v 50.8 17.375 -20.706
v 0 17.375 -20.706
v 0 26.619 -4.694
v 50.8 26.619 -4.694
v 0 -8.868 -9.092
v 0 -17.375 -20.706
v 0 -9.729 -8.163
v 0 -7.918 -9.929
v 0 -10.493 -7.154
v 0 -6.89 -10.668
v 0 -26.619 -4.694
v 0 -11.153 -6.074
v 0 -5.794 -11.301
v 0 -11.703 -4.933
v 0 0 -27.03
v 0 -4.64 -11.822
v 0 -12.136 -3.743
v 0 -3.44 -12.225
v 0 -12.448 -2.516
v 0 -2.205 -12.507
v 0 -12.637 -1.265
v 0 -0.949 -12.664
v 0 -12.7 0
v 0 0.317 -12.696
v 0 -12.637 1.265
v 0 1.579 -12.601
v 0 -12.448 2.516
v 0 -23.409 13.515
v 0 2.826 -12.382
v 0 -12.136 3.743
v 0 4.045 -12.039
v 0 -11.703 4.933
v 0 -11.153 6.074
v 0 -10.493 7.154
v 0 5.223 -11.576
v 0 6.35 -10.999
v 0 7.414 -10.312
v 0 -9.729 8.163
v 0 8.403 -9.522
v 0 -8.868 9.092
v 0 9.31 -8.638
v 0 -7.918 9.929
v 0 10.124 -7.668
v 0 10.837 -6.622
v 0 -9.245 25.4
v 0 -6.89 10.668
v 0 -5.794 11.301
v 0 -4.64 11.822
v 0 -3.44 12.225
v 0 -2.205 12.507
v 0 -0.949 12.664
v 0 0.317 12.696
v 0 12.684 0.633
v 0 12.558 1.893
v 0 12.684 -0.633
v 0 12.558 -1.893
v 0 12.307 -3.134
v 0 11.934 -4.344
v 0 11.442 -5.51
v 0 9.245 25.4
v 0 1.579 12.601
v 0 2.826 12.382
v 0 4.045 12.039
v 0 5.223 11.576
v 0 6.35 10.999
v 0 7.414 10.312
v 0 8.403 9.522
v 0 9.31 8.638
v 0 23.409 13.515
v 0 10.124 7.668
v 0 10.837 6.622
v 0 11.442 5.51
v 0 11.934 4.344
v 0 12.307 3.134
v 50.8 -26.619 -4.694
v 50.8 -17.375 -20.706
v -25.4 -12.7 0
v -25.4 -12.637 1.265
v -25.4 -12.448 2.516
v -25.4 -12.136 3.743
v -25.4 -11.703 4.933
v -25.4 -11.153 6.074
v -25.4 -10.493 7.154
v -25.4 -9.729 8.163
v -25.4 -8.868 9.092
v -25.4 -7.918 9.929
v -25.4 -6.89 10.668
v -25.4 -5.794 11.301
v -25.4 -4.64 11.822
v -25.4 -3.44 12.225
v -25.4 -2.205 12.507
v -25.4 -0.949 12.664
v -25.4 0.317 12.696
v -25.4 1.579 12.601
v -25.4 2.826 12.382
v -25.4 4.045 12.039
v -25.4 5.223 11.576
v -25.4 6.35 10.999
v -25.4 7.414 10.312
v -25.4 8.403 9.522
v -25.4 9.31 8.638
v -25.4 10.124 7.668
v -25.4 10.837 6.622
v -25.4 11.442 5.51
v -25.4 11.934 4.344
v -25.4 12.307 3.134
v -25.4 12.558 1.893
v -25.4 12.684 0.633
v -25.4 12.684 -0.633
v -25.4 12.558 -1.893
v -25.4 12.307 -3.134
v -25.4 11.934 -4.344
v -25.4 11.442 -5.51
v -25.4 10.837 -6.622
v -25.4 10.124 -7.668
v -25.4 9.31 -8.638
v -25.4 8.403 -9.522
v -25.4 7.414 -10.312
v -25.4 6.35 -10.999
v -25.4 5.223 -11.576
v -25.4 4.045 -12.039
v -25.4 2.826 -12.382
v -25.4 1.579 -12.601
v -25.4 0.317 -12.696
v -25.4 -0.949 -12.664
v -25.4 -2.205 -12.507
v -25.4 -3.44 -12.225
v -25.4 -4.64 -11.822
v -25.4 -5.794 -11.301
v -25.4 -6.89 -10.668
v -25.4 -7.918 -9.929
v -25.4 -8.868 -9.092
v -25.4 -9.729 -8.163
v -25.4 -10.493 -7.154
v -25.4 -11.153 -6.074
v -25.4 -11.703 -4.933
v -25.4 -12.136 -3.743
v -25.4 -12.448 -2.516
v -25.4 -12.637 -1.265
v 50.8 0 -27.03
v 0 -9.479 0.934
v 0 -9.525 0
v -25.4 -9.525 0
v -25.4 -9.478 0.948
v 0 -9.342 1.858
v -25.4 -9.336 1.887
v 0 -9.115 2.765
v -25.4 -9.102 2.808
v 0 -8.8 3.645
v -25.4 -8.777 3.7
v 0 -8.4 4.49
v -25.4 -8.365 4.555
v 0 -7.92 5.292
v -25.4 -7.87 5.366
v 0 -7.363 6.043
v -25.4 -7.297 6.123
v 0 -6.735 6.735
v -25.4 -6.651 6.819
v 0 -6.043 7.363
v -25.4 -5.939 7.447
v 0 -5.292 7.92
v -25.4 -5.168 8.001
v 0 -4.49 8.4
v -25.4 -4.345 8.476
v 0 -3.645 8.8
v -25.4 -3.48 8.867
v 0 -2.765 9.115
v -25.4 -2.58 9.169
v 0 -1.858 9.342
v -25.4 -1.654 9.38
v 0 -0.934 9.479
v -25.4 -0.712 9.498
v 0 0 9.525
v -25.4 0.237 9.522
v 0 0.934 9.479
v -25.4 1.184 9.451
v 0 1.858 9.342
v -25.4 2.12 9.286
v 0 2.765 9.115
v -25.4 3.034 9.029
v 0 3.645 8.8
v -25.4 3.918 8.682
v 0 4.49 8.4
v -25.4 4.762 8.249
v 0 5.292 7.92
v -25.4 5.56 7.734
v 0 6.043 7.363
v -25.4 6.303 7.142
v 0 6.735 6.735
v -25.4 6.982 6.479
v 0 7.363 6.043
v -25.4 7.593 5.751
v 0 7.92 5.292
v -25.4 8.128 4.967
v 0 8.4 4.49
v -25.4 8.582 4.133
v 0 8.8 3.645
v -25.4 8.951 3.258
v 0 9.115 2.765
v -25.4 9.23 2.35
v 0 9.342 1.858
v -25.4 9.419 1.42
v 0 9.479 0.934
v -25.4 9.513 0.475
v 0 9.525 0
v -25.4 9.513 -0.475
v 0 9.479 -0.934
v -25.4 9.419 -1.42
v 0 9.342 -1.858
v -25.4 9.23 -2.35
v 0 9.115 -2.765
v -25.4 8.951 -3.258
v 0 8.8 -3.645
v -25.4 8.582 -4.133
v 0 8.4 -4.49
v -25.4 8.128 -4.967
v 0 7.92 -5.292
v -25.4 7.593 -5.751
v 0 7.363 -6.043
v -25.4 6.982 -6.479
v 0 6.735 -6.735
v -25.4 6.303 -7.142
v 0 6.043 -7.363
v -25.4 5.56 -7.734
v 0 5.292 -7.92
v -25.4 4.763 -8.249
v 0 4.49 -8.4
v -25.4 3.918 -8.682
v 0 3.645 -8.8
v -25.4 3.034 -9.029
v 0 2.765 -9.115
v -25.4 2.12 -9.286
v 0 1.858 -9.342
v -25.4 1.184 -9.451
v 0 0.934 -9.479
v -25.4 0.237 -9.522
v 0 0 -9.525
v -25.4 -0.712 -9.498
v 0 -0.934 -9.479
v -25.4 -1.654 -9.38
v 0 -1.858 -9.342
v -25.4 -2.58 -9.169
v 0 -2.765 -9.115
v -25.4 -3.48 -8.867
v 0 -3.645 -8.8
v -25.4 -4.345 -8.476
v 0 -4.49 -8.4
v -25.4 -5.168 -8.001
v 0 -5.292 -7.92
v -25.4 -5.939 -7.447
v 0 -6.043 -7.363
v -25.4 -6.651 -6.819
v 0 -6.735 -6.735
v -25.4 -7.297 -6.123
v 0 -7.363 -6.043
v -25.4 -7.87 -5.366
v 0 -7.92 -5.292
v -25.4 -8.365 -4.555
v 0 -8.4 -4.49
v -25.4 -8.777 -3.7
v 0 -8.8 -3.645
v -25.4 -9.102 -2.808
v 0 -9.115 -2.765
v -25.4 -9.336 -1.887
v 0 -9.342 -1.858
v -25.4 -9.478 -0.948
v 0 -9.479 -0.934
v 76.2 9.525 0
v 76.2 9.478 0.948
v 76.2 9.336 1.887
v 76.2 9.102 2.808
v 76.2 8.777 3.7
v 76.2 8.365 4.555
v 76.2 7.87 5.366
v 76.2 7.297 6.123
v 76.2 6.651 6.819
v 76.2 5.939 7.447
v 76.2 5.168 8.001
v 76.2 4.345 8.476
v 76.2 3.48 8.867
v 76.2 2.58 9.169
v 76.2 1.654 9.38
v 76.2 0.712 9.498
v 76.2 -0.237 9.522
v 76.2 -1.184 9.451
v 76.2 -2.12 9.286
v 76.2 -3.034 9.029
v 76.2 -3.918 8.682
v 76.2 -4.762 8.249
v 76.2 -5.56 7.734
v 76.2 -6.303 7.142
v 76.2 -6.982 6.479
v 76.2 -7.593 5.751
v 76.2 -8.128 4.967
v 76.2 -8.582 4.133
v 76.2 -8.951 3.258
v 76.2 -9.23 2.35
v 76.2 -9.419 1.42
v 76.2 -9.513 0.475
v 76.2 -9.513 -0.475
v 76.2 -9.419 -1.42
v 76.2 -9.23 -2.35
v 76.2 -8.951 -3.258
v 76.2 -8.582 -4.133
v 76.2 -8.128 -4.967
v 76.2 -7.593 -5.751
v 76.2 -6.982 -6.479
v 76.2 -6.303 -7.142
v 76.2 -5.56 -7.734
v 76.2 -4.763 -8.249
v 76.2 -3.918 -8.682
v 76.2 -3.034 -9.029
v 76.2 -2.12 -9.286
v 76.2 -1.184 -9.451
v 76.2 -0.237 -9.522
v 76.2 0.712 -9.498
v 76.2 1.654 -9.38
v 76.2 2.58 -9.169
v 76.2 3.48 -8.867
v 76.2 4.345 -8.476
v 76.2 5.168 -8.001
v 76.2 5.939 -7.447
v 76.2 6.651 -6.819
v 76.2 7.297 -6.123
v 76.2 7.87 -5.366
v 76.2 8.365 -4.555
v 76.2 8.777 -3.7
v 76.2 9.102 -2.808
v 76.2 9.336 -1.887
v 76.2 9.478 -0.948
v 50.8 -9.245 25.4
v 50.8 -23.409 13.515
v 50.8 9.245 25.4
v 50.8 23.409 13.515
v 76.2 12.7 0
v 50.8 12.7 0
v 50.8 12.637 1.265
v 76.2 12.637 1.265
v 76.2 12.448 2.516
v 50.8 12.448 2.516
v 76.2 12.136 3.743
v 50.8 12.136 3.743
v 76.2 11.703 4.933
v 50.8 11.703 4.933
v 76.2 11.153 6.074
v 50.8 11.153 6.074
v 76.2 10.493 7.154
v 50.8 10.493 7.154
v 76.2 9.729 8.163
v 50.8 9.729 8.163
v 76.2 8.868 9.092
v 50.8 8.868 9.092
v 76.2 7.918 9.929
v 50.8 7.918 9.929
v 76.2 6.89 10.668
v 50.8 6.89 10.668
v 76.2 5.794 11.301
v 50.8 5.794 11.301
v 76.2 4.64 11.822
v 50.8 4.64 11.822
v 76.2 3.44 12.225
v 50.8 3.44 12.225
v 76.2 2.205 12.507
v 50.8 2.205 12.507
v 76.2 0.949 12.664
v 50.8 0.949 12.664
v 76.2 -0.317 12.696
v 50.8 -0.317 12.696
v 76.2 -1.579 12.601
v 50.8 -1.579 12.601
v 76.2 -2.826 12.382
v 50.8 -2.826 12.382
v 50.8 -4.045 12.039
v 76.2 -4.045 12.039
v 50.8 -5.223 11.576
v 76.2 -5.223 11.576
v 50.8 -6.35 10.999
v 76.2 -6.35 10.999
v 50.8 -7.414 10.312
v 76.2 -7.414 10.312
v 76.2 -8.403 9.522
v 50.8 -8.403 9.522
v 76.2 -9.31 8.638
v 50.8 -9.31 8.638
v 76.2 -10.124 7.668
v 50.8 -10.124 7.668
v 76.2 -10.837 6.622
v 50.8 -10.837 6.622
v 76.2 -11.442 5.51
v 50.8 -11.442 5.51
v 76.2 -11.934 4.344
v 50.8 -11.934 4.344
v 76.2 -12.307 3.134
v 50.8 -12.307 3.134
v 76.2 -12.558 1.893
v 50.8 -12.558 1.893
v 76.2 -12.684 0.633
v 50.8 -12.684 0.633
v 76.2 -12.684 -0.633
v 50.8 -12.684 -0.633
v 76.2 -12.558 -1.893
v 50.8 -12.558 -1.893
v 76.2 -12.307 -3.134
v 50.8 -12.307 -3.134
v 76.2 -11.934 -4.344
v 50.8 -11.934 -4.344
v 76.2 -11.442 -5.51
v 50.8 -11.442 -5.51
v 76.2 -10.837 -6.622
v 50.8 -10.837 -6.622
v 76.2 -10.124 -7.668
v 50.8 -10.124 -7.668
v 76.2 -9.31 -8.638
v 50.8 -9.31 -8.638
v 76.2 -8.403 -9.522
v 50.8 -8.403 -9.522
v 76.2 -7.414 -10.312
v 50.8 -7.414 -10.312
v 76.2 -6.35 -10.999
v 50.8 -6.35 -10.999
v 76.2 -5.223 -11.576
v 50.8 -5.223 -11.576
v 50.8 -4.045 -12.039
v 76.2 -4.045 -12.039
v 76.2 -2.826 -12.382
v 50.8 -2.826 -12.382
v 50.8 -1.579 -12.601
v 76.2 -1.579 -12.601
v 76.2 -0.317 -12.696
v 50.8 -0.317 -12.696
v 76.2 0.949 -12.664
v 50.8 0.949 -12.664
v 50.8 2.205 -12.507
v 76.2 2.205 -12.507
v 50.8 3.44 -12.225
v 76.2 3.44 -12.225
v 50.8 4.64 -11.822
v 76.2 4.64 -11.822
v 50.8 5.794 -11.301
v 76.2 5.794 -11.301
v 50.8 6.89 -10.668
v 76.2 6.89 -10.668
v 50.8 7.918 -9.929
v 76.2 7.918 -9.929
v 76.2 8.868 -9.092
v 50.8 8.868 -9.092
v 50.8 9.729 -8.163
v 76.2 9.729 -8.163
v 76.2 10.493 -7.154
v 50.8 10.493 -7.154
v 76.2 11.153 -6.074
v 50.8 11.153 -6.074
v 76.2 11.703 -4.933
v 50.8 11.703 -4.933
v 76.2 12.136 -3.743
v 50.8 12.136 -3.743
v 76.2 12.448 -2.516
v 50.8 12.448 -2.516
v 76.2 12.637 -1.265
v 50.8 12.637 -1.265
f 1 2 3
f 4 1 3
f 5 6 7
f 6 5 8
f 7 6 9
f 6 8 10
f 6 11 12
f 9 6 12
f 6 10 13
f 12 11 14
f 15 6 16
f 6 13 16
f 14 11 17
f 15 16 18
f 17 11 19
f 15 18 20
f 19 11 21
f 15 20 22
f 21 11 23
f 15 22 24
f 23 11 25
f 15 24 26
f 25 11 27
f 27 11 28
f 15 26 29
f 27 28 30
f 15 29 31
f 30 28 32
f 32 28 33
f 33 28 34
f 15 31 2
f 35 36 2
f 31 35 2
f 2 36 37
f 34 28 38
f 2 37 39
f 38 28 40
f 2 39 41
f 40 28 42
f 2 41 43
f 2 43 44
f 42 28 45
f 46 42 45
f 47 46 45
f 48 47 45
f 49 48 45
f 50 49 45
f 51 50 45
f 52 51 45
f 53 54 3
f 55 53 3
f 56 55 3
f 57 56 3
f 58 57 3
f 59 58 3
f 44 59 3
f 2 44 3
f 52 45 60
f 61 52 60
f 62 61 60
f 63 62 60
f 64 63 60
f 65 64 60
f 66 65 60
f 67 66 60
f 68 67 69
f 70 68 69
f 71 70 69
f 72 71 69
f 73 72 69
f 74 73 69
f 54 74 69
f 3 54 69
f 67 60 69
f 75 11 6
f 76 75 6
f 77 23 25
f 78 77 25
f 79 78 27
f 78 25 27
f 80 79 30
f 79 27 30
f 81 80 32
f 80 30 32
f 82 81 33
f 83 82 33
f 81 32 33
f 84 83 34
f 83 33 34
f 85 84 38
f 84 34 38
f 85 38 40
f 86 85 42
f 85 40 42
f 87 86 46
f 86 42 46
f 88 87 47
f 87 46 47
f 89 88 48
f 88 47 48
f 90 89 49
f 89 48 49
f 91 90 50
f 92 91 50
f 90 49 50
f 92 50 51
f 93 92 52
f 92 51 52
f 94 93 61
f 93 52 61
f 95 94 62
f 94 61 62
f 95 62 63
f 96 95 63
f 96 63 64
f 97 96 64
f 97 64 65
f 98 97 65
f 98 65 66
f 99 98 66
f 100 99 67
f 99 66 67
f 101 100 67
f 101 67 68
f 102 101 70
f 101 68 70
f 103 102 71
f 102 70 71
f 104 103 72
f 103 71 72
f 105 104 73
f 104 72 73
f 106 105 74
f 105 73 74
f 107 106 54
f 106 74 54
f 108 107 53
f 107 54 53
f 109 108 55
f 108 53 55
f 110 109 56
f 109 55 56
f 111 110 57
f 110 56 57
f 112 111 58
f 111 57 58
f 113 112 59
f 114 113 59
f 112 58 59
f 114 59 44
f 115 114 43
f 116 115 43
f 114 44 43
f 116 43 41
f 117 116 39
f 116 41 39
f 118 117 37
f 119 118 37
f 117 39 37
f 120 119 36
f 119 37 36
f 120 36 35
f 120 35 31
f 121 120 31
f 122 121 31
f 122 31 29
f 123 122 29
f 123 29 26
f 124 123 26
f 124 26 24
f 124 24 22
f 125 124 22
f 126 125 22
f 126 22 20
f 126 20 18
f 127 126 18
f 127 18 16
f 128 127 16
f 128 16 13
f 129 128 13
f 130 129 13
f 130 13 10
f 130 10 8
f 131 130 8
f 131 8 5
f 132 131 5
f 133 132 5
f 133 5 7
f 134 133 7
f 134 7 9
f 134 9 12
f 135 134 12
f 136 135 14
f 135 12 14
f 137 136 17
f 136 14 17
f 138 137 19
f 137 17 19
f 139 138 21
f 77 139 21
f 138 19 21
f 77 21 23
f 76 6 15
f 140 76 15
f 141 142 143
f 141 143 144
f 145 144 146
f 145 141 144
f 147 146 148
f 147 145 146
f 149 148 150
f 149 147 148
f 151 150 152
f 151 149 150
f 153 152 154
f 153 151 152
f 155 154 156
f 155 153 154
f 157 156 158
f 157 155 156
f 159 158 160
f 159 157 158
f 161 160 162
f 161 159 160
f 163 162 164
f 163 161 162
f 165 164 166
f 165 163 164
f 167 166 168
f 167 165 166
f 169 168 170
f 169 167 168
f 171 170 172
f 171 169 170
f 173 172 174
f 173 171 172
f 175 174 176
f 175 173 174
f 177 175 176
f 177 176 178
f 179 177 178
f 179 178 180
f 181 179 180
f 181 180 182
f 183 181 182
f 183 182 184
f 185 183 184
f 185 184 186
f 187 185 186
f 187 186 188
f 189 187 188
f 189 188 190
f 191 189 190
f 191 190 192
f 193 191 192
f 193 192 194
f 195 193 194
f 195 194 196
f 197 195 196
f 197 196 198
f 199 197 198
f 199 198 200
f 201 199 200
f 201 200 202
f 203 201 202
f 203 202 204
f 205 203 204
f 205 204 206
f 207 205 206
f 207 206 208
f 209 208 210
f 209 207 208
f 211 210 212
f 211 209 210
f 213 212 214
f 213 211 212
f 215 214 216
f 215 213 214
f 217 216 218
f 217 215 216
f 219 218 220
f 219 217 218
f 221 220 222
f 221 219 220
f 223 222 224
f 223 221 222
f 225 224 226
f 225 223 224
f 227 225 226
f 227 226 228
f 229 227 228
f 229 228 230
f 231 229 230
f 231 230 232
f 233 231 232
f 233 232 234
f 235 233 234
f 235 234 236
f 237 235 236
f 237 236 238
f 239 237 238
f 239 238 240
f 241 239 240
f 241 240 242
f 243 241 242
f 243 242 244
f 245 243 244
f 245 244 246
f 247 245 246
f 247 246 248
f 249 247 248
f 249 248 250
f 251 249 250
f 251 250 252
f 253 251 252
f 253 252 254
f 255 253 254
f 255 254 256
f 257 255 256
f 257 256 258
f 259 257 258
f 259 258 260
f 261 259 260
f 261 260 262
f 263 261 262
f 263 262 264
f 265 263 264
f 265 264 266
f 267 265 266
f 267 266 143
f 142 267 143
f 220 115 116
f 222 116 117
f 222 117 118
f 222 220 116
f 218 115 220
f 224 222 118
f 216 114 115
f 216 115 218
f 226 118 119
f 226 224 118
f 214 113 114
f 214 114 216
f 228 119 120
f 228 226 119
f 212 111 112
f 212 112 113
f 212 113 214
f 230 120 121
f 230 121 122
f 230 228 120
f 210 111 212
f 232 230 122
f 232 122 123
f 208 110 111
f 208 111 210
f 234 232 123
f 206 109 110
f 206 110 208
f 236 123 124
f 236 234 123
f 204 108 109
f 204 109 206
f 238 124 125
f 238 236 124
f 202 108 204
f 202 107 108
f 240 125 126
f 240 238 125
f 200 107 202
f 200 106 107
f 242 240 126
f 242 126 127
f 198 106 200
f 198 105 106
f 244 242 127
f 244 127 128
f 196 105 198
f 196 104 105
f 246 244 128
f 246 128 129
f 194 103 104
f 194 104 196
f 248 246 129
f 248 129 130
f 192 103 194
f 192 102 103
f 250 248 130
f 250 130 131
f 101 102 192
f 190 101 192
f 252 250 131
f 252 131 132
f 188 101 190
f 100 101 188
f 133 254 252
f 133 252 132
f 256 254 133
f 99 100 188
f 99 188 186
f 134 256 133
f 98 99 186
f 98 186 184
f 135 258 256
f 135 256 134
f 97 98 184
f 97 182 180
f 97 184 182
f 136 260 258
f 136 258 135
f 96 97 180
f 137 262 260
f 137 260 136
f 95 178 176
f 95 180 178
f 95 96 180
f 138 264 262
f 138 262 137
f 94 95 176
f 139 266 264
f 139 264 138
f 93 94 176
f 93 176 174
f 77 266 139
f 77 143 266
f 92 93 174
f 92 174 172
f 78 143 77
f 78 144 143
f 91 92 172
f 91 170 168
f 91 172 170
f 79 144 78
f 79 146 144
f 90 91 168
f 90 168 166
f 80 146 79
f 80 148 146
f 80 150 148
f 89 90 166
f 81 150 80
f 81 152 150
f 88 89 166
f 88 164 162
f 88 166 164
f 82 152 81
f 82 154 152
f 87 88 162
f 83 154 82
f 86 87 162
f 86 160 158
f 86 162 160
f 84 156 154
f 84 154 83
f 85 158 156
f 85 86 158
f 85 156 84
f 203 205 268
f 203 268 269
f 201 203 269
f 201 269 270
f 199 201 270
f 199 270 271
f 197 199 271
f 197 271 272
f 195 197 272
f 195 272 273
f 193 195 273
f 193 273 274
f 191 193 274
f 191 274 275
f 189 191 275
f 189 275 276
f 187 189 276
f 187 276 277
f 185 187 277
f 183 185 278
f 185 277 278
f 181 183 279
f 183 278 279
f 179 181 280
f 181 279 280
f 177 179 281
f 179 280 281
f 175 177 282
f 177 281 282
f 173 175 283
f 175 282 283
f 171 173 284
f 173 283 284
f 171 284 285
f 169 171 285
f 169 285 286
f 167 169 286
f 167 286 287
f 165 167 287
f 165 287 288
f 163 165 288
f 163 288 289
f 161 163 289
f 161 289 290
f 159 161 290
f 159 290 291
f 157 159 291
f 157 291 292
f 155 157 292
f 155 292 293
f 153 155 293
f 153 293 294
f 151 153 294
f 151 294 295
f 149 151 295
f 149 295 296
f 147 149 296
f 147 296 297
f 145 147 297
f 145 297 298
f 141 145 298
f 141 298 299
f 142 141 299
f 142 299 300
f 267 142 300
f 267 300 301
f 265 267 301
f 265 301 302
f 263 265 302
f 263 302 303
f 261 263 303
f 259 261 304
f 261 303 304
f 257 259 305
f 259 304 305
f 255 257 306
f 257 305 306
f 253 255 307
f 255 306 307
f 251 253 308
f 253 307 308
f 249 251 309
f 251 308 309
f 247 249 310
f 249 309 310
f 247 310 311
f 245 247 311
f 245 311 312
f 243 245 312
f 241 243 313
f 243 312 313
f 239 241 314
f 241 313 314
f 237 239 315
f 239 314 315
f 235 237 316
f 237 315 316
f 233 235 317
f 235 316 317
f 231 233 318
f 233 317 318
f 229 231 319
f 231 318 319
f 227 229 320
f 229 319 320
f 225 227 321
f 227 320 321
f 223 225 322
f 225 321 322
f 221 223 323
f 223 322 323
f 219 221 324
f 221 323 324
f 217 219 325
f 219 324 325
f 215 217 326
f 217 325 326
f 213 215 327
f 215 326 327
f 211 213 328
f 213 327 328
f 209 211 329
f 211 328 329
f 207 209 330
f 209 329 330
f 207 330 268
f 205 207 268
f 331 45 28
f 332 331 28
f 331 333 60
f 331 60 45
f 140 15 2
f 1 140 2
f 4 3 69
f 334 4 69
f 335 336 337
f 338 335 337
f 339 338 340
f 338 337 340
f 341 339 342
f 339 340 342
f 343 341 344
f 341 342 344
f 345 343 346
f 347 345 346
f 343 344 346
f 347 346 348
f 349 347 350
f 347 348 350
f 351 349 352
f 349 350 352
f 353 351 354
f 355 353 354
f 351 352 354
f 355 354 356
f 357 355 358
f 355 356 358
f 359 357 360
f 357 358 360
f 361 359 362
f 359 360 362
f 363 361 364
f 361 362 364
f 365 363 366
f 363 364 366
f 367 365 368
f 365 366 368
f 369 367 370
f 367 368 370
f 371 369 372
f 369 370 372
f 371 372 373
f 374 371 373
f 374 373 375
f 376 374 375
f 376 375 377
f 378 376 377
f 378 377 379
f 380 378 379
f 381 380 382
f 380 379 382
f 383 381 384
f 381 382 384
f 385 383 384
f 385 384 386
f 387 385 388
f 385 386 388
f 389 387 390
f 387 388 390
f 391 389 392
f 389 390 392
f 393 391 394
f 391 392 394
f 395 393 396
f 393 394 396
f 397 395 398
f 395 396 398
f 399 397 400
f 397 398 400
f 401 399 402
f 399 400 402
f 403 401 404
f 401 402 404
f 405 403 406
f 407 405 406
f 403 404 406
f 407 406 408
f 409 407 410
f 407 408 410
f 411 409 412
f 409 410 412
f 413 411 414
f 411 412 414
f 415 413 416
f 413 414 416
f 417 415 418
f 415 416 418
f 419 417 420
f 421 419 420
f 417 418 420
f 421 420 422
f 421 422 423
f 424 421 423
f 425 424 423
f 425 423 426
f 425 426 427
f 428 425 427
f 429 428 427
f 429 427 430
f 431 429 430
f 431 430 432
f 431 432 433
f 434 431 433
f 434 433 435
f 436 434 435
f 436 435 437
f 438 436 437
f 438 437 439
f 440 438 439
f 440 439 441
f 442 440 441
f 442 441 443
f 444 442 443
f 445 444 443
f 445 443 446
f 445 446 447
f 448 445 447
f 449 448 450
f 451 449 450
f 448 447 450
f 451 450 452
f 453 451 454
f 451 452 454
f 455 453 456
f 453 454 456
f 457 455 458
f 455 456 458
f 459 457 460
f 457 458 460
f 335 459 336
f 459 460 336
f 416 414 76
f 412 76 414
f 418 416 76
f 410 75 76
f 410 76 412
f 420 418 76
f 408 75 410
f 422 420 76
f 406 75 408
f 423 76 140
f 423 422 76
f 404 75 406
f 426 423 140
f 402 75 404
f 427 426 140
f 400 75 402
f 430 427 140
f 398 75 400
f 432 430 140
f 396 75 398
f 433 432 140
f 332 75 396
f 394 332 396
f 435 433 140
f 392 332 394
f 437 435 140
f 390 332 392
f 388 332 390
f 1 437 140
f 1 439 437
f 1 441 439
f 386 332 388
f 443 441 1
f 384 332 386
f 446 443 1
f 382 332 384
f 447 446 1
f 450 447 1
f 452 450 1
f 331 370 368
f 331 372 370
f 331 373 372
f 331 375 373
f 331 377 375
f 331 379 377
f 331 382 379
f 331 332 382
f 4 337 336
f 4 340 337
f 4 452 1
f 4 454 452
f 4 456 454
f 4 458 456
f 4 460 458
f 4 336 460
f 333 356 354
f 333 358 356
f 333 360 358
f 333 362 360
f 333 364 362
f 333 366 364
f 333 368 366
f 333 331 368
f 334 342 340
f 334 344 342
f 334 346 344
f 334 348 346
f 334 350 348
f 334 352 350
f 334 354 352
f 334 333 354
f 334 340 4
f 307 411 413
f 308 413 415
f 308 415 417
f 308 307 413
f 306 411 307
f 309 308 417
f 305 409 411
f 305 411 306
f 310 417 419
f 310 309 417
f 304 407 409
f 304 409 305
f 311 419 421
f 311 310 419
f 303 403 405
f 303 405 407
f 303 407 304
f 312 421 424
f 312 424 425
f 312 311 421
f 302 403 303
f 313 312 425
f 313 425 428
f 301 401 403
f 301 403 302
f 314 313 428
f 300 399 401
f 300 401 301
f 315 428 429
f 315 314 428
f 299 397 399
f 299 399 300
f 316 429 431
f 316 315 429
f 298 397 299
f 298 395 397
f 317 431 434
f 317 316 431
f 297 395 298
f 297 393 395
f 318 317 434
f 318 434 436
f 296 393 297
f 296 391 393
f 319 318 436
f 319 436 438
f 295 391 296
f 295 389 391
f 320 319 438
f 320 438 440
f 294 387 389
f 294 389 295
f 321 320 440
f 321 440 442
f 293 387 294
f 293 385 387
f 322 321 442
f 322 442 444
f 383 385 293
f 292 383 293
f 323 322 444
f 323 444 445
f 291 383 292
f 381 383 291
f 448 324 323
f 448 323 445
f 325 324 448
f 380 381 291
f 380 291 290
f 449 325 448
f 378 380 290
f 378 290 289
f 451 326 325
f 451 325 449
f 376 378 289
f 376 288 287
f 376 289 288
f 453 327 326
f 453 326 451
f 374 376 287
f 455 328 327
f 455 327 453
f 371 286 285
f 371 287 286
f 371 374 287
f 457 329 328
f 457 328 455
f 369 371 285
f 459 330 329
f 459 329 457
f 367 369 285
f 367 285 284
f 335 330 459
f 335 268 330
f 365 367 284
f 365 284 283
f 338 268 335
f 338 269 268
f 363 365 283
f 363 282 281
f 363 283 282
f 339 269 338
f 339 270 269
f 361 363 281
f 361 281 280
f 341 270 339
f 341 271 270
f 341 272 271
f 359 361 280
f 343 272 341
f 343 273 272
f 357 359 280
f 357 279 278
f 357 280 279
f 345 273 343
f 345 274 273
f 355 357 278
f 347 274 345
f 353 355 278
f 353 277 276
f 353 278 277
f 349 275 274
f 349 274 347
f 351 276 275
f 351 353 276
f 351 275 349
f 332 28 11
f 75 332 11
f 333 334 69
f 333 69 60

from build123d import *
from build123d import SkipClean  # not in build123d's __all__

# Parameters (mm, degrees)
F1_DEPTH = 50.8
F2_R     = 12.7
F3_DEPTH = 25.4
F4_R     = 9.525
F5_DEPTH = 76.2
F6_R     = 12.7
F6_R_2   = 9.525
F7_DEPTH = 25.4


with BuildPart() as f1:
    # F0 (on Right) → F1 (new body)
    with BuildSketch(Plane.YZ):
        Polygon((9.2448439504, 25.4), (-9.2448439504, 25.4), (-23.4087666217, 13.5150577104), (-26.6194672313, -4.693730285), (-17.3746232809, -20.706269715), (0, -27.0301154209), (17.3746232809, -20.706269715), (26.6194672313, -4.693730285), (23.4087666217, 13.5150577104), align=None)
    extrude(amount=F1_DEPTH)

    # F2 (on face) → F3 (join)
    with BuildSketch(Plane.YZ.offset(50.8)):
        Circle(F2_R)
    extrude(amount=F3_DEPTH)

    # F4 (on face) → F5 (cut)
    with BuildSketch(Plane.YZ.offset(76.2)):
        Circle(F4_R)
    extrude(amount=-F5_DEPTH, mode=Mode.SUBTRACT)

    # F6 (on face) → F7 (join)
    with BuildSketch(Plane(origin=(0, 0, 0), x_dir=(0, -1, 0), z_dir=(-1, 0, 0))):
        Circle(F6_R)
        Circle(F6_R_2, mode=Mode.SUBTRACT)
    with SkipClean():  # cleaning this boolean's faces spoils the solid; the shape is the same uncleaned
        extrude(amount=F7_DEPTH)


solid = f1.part
